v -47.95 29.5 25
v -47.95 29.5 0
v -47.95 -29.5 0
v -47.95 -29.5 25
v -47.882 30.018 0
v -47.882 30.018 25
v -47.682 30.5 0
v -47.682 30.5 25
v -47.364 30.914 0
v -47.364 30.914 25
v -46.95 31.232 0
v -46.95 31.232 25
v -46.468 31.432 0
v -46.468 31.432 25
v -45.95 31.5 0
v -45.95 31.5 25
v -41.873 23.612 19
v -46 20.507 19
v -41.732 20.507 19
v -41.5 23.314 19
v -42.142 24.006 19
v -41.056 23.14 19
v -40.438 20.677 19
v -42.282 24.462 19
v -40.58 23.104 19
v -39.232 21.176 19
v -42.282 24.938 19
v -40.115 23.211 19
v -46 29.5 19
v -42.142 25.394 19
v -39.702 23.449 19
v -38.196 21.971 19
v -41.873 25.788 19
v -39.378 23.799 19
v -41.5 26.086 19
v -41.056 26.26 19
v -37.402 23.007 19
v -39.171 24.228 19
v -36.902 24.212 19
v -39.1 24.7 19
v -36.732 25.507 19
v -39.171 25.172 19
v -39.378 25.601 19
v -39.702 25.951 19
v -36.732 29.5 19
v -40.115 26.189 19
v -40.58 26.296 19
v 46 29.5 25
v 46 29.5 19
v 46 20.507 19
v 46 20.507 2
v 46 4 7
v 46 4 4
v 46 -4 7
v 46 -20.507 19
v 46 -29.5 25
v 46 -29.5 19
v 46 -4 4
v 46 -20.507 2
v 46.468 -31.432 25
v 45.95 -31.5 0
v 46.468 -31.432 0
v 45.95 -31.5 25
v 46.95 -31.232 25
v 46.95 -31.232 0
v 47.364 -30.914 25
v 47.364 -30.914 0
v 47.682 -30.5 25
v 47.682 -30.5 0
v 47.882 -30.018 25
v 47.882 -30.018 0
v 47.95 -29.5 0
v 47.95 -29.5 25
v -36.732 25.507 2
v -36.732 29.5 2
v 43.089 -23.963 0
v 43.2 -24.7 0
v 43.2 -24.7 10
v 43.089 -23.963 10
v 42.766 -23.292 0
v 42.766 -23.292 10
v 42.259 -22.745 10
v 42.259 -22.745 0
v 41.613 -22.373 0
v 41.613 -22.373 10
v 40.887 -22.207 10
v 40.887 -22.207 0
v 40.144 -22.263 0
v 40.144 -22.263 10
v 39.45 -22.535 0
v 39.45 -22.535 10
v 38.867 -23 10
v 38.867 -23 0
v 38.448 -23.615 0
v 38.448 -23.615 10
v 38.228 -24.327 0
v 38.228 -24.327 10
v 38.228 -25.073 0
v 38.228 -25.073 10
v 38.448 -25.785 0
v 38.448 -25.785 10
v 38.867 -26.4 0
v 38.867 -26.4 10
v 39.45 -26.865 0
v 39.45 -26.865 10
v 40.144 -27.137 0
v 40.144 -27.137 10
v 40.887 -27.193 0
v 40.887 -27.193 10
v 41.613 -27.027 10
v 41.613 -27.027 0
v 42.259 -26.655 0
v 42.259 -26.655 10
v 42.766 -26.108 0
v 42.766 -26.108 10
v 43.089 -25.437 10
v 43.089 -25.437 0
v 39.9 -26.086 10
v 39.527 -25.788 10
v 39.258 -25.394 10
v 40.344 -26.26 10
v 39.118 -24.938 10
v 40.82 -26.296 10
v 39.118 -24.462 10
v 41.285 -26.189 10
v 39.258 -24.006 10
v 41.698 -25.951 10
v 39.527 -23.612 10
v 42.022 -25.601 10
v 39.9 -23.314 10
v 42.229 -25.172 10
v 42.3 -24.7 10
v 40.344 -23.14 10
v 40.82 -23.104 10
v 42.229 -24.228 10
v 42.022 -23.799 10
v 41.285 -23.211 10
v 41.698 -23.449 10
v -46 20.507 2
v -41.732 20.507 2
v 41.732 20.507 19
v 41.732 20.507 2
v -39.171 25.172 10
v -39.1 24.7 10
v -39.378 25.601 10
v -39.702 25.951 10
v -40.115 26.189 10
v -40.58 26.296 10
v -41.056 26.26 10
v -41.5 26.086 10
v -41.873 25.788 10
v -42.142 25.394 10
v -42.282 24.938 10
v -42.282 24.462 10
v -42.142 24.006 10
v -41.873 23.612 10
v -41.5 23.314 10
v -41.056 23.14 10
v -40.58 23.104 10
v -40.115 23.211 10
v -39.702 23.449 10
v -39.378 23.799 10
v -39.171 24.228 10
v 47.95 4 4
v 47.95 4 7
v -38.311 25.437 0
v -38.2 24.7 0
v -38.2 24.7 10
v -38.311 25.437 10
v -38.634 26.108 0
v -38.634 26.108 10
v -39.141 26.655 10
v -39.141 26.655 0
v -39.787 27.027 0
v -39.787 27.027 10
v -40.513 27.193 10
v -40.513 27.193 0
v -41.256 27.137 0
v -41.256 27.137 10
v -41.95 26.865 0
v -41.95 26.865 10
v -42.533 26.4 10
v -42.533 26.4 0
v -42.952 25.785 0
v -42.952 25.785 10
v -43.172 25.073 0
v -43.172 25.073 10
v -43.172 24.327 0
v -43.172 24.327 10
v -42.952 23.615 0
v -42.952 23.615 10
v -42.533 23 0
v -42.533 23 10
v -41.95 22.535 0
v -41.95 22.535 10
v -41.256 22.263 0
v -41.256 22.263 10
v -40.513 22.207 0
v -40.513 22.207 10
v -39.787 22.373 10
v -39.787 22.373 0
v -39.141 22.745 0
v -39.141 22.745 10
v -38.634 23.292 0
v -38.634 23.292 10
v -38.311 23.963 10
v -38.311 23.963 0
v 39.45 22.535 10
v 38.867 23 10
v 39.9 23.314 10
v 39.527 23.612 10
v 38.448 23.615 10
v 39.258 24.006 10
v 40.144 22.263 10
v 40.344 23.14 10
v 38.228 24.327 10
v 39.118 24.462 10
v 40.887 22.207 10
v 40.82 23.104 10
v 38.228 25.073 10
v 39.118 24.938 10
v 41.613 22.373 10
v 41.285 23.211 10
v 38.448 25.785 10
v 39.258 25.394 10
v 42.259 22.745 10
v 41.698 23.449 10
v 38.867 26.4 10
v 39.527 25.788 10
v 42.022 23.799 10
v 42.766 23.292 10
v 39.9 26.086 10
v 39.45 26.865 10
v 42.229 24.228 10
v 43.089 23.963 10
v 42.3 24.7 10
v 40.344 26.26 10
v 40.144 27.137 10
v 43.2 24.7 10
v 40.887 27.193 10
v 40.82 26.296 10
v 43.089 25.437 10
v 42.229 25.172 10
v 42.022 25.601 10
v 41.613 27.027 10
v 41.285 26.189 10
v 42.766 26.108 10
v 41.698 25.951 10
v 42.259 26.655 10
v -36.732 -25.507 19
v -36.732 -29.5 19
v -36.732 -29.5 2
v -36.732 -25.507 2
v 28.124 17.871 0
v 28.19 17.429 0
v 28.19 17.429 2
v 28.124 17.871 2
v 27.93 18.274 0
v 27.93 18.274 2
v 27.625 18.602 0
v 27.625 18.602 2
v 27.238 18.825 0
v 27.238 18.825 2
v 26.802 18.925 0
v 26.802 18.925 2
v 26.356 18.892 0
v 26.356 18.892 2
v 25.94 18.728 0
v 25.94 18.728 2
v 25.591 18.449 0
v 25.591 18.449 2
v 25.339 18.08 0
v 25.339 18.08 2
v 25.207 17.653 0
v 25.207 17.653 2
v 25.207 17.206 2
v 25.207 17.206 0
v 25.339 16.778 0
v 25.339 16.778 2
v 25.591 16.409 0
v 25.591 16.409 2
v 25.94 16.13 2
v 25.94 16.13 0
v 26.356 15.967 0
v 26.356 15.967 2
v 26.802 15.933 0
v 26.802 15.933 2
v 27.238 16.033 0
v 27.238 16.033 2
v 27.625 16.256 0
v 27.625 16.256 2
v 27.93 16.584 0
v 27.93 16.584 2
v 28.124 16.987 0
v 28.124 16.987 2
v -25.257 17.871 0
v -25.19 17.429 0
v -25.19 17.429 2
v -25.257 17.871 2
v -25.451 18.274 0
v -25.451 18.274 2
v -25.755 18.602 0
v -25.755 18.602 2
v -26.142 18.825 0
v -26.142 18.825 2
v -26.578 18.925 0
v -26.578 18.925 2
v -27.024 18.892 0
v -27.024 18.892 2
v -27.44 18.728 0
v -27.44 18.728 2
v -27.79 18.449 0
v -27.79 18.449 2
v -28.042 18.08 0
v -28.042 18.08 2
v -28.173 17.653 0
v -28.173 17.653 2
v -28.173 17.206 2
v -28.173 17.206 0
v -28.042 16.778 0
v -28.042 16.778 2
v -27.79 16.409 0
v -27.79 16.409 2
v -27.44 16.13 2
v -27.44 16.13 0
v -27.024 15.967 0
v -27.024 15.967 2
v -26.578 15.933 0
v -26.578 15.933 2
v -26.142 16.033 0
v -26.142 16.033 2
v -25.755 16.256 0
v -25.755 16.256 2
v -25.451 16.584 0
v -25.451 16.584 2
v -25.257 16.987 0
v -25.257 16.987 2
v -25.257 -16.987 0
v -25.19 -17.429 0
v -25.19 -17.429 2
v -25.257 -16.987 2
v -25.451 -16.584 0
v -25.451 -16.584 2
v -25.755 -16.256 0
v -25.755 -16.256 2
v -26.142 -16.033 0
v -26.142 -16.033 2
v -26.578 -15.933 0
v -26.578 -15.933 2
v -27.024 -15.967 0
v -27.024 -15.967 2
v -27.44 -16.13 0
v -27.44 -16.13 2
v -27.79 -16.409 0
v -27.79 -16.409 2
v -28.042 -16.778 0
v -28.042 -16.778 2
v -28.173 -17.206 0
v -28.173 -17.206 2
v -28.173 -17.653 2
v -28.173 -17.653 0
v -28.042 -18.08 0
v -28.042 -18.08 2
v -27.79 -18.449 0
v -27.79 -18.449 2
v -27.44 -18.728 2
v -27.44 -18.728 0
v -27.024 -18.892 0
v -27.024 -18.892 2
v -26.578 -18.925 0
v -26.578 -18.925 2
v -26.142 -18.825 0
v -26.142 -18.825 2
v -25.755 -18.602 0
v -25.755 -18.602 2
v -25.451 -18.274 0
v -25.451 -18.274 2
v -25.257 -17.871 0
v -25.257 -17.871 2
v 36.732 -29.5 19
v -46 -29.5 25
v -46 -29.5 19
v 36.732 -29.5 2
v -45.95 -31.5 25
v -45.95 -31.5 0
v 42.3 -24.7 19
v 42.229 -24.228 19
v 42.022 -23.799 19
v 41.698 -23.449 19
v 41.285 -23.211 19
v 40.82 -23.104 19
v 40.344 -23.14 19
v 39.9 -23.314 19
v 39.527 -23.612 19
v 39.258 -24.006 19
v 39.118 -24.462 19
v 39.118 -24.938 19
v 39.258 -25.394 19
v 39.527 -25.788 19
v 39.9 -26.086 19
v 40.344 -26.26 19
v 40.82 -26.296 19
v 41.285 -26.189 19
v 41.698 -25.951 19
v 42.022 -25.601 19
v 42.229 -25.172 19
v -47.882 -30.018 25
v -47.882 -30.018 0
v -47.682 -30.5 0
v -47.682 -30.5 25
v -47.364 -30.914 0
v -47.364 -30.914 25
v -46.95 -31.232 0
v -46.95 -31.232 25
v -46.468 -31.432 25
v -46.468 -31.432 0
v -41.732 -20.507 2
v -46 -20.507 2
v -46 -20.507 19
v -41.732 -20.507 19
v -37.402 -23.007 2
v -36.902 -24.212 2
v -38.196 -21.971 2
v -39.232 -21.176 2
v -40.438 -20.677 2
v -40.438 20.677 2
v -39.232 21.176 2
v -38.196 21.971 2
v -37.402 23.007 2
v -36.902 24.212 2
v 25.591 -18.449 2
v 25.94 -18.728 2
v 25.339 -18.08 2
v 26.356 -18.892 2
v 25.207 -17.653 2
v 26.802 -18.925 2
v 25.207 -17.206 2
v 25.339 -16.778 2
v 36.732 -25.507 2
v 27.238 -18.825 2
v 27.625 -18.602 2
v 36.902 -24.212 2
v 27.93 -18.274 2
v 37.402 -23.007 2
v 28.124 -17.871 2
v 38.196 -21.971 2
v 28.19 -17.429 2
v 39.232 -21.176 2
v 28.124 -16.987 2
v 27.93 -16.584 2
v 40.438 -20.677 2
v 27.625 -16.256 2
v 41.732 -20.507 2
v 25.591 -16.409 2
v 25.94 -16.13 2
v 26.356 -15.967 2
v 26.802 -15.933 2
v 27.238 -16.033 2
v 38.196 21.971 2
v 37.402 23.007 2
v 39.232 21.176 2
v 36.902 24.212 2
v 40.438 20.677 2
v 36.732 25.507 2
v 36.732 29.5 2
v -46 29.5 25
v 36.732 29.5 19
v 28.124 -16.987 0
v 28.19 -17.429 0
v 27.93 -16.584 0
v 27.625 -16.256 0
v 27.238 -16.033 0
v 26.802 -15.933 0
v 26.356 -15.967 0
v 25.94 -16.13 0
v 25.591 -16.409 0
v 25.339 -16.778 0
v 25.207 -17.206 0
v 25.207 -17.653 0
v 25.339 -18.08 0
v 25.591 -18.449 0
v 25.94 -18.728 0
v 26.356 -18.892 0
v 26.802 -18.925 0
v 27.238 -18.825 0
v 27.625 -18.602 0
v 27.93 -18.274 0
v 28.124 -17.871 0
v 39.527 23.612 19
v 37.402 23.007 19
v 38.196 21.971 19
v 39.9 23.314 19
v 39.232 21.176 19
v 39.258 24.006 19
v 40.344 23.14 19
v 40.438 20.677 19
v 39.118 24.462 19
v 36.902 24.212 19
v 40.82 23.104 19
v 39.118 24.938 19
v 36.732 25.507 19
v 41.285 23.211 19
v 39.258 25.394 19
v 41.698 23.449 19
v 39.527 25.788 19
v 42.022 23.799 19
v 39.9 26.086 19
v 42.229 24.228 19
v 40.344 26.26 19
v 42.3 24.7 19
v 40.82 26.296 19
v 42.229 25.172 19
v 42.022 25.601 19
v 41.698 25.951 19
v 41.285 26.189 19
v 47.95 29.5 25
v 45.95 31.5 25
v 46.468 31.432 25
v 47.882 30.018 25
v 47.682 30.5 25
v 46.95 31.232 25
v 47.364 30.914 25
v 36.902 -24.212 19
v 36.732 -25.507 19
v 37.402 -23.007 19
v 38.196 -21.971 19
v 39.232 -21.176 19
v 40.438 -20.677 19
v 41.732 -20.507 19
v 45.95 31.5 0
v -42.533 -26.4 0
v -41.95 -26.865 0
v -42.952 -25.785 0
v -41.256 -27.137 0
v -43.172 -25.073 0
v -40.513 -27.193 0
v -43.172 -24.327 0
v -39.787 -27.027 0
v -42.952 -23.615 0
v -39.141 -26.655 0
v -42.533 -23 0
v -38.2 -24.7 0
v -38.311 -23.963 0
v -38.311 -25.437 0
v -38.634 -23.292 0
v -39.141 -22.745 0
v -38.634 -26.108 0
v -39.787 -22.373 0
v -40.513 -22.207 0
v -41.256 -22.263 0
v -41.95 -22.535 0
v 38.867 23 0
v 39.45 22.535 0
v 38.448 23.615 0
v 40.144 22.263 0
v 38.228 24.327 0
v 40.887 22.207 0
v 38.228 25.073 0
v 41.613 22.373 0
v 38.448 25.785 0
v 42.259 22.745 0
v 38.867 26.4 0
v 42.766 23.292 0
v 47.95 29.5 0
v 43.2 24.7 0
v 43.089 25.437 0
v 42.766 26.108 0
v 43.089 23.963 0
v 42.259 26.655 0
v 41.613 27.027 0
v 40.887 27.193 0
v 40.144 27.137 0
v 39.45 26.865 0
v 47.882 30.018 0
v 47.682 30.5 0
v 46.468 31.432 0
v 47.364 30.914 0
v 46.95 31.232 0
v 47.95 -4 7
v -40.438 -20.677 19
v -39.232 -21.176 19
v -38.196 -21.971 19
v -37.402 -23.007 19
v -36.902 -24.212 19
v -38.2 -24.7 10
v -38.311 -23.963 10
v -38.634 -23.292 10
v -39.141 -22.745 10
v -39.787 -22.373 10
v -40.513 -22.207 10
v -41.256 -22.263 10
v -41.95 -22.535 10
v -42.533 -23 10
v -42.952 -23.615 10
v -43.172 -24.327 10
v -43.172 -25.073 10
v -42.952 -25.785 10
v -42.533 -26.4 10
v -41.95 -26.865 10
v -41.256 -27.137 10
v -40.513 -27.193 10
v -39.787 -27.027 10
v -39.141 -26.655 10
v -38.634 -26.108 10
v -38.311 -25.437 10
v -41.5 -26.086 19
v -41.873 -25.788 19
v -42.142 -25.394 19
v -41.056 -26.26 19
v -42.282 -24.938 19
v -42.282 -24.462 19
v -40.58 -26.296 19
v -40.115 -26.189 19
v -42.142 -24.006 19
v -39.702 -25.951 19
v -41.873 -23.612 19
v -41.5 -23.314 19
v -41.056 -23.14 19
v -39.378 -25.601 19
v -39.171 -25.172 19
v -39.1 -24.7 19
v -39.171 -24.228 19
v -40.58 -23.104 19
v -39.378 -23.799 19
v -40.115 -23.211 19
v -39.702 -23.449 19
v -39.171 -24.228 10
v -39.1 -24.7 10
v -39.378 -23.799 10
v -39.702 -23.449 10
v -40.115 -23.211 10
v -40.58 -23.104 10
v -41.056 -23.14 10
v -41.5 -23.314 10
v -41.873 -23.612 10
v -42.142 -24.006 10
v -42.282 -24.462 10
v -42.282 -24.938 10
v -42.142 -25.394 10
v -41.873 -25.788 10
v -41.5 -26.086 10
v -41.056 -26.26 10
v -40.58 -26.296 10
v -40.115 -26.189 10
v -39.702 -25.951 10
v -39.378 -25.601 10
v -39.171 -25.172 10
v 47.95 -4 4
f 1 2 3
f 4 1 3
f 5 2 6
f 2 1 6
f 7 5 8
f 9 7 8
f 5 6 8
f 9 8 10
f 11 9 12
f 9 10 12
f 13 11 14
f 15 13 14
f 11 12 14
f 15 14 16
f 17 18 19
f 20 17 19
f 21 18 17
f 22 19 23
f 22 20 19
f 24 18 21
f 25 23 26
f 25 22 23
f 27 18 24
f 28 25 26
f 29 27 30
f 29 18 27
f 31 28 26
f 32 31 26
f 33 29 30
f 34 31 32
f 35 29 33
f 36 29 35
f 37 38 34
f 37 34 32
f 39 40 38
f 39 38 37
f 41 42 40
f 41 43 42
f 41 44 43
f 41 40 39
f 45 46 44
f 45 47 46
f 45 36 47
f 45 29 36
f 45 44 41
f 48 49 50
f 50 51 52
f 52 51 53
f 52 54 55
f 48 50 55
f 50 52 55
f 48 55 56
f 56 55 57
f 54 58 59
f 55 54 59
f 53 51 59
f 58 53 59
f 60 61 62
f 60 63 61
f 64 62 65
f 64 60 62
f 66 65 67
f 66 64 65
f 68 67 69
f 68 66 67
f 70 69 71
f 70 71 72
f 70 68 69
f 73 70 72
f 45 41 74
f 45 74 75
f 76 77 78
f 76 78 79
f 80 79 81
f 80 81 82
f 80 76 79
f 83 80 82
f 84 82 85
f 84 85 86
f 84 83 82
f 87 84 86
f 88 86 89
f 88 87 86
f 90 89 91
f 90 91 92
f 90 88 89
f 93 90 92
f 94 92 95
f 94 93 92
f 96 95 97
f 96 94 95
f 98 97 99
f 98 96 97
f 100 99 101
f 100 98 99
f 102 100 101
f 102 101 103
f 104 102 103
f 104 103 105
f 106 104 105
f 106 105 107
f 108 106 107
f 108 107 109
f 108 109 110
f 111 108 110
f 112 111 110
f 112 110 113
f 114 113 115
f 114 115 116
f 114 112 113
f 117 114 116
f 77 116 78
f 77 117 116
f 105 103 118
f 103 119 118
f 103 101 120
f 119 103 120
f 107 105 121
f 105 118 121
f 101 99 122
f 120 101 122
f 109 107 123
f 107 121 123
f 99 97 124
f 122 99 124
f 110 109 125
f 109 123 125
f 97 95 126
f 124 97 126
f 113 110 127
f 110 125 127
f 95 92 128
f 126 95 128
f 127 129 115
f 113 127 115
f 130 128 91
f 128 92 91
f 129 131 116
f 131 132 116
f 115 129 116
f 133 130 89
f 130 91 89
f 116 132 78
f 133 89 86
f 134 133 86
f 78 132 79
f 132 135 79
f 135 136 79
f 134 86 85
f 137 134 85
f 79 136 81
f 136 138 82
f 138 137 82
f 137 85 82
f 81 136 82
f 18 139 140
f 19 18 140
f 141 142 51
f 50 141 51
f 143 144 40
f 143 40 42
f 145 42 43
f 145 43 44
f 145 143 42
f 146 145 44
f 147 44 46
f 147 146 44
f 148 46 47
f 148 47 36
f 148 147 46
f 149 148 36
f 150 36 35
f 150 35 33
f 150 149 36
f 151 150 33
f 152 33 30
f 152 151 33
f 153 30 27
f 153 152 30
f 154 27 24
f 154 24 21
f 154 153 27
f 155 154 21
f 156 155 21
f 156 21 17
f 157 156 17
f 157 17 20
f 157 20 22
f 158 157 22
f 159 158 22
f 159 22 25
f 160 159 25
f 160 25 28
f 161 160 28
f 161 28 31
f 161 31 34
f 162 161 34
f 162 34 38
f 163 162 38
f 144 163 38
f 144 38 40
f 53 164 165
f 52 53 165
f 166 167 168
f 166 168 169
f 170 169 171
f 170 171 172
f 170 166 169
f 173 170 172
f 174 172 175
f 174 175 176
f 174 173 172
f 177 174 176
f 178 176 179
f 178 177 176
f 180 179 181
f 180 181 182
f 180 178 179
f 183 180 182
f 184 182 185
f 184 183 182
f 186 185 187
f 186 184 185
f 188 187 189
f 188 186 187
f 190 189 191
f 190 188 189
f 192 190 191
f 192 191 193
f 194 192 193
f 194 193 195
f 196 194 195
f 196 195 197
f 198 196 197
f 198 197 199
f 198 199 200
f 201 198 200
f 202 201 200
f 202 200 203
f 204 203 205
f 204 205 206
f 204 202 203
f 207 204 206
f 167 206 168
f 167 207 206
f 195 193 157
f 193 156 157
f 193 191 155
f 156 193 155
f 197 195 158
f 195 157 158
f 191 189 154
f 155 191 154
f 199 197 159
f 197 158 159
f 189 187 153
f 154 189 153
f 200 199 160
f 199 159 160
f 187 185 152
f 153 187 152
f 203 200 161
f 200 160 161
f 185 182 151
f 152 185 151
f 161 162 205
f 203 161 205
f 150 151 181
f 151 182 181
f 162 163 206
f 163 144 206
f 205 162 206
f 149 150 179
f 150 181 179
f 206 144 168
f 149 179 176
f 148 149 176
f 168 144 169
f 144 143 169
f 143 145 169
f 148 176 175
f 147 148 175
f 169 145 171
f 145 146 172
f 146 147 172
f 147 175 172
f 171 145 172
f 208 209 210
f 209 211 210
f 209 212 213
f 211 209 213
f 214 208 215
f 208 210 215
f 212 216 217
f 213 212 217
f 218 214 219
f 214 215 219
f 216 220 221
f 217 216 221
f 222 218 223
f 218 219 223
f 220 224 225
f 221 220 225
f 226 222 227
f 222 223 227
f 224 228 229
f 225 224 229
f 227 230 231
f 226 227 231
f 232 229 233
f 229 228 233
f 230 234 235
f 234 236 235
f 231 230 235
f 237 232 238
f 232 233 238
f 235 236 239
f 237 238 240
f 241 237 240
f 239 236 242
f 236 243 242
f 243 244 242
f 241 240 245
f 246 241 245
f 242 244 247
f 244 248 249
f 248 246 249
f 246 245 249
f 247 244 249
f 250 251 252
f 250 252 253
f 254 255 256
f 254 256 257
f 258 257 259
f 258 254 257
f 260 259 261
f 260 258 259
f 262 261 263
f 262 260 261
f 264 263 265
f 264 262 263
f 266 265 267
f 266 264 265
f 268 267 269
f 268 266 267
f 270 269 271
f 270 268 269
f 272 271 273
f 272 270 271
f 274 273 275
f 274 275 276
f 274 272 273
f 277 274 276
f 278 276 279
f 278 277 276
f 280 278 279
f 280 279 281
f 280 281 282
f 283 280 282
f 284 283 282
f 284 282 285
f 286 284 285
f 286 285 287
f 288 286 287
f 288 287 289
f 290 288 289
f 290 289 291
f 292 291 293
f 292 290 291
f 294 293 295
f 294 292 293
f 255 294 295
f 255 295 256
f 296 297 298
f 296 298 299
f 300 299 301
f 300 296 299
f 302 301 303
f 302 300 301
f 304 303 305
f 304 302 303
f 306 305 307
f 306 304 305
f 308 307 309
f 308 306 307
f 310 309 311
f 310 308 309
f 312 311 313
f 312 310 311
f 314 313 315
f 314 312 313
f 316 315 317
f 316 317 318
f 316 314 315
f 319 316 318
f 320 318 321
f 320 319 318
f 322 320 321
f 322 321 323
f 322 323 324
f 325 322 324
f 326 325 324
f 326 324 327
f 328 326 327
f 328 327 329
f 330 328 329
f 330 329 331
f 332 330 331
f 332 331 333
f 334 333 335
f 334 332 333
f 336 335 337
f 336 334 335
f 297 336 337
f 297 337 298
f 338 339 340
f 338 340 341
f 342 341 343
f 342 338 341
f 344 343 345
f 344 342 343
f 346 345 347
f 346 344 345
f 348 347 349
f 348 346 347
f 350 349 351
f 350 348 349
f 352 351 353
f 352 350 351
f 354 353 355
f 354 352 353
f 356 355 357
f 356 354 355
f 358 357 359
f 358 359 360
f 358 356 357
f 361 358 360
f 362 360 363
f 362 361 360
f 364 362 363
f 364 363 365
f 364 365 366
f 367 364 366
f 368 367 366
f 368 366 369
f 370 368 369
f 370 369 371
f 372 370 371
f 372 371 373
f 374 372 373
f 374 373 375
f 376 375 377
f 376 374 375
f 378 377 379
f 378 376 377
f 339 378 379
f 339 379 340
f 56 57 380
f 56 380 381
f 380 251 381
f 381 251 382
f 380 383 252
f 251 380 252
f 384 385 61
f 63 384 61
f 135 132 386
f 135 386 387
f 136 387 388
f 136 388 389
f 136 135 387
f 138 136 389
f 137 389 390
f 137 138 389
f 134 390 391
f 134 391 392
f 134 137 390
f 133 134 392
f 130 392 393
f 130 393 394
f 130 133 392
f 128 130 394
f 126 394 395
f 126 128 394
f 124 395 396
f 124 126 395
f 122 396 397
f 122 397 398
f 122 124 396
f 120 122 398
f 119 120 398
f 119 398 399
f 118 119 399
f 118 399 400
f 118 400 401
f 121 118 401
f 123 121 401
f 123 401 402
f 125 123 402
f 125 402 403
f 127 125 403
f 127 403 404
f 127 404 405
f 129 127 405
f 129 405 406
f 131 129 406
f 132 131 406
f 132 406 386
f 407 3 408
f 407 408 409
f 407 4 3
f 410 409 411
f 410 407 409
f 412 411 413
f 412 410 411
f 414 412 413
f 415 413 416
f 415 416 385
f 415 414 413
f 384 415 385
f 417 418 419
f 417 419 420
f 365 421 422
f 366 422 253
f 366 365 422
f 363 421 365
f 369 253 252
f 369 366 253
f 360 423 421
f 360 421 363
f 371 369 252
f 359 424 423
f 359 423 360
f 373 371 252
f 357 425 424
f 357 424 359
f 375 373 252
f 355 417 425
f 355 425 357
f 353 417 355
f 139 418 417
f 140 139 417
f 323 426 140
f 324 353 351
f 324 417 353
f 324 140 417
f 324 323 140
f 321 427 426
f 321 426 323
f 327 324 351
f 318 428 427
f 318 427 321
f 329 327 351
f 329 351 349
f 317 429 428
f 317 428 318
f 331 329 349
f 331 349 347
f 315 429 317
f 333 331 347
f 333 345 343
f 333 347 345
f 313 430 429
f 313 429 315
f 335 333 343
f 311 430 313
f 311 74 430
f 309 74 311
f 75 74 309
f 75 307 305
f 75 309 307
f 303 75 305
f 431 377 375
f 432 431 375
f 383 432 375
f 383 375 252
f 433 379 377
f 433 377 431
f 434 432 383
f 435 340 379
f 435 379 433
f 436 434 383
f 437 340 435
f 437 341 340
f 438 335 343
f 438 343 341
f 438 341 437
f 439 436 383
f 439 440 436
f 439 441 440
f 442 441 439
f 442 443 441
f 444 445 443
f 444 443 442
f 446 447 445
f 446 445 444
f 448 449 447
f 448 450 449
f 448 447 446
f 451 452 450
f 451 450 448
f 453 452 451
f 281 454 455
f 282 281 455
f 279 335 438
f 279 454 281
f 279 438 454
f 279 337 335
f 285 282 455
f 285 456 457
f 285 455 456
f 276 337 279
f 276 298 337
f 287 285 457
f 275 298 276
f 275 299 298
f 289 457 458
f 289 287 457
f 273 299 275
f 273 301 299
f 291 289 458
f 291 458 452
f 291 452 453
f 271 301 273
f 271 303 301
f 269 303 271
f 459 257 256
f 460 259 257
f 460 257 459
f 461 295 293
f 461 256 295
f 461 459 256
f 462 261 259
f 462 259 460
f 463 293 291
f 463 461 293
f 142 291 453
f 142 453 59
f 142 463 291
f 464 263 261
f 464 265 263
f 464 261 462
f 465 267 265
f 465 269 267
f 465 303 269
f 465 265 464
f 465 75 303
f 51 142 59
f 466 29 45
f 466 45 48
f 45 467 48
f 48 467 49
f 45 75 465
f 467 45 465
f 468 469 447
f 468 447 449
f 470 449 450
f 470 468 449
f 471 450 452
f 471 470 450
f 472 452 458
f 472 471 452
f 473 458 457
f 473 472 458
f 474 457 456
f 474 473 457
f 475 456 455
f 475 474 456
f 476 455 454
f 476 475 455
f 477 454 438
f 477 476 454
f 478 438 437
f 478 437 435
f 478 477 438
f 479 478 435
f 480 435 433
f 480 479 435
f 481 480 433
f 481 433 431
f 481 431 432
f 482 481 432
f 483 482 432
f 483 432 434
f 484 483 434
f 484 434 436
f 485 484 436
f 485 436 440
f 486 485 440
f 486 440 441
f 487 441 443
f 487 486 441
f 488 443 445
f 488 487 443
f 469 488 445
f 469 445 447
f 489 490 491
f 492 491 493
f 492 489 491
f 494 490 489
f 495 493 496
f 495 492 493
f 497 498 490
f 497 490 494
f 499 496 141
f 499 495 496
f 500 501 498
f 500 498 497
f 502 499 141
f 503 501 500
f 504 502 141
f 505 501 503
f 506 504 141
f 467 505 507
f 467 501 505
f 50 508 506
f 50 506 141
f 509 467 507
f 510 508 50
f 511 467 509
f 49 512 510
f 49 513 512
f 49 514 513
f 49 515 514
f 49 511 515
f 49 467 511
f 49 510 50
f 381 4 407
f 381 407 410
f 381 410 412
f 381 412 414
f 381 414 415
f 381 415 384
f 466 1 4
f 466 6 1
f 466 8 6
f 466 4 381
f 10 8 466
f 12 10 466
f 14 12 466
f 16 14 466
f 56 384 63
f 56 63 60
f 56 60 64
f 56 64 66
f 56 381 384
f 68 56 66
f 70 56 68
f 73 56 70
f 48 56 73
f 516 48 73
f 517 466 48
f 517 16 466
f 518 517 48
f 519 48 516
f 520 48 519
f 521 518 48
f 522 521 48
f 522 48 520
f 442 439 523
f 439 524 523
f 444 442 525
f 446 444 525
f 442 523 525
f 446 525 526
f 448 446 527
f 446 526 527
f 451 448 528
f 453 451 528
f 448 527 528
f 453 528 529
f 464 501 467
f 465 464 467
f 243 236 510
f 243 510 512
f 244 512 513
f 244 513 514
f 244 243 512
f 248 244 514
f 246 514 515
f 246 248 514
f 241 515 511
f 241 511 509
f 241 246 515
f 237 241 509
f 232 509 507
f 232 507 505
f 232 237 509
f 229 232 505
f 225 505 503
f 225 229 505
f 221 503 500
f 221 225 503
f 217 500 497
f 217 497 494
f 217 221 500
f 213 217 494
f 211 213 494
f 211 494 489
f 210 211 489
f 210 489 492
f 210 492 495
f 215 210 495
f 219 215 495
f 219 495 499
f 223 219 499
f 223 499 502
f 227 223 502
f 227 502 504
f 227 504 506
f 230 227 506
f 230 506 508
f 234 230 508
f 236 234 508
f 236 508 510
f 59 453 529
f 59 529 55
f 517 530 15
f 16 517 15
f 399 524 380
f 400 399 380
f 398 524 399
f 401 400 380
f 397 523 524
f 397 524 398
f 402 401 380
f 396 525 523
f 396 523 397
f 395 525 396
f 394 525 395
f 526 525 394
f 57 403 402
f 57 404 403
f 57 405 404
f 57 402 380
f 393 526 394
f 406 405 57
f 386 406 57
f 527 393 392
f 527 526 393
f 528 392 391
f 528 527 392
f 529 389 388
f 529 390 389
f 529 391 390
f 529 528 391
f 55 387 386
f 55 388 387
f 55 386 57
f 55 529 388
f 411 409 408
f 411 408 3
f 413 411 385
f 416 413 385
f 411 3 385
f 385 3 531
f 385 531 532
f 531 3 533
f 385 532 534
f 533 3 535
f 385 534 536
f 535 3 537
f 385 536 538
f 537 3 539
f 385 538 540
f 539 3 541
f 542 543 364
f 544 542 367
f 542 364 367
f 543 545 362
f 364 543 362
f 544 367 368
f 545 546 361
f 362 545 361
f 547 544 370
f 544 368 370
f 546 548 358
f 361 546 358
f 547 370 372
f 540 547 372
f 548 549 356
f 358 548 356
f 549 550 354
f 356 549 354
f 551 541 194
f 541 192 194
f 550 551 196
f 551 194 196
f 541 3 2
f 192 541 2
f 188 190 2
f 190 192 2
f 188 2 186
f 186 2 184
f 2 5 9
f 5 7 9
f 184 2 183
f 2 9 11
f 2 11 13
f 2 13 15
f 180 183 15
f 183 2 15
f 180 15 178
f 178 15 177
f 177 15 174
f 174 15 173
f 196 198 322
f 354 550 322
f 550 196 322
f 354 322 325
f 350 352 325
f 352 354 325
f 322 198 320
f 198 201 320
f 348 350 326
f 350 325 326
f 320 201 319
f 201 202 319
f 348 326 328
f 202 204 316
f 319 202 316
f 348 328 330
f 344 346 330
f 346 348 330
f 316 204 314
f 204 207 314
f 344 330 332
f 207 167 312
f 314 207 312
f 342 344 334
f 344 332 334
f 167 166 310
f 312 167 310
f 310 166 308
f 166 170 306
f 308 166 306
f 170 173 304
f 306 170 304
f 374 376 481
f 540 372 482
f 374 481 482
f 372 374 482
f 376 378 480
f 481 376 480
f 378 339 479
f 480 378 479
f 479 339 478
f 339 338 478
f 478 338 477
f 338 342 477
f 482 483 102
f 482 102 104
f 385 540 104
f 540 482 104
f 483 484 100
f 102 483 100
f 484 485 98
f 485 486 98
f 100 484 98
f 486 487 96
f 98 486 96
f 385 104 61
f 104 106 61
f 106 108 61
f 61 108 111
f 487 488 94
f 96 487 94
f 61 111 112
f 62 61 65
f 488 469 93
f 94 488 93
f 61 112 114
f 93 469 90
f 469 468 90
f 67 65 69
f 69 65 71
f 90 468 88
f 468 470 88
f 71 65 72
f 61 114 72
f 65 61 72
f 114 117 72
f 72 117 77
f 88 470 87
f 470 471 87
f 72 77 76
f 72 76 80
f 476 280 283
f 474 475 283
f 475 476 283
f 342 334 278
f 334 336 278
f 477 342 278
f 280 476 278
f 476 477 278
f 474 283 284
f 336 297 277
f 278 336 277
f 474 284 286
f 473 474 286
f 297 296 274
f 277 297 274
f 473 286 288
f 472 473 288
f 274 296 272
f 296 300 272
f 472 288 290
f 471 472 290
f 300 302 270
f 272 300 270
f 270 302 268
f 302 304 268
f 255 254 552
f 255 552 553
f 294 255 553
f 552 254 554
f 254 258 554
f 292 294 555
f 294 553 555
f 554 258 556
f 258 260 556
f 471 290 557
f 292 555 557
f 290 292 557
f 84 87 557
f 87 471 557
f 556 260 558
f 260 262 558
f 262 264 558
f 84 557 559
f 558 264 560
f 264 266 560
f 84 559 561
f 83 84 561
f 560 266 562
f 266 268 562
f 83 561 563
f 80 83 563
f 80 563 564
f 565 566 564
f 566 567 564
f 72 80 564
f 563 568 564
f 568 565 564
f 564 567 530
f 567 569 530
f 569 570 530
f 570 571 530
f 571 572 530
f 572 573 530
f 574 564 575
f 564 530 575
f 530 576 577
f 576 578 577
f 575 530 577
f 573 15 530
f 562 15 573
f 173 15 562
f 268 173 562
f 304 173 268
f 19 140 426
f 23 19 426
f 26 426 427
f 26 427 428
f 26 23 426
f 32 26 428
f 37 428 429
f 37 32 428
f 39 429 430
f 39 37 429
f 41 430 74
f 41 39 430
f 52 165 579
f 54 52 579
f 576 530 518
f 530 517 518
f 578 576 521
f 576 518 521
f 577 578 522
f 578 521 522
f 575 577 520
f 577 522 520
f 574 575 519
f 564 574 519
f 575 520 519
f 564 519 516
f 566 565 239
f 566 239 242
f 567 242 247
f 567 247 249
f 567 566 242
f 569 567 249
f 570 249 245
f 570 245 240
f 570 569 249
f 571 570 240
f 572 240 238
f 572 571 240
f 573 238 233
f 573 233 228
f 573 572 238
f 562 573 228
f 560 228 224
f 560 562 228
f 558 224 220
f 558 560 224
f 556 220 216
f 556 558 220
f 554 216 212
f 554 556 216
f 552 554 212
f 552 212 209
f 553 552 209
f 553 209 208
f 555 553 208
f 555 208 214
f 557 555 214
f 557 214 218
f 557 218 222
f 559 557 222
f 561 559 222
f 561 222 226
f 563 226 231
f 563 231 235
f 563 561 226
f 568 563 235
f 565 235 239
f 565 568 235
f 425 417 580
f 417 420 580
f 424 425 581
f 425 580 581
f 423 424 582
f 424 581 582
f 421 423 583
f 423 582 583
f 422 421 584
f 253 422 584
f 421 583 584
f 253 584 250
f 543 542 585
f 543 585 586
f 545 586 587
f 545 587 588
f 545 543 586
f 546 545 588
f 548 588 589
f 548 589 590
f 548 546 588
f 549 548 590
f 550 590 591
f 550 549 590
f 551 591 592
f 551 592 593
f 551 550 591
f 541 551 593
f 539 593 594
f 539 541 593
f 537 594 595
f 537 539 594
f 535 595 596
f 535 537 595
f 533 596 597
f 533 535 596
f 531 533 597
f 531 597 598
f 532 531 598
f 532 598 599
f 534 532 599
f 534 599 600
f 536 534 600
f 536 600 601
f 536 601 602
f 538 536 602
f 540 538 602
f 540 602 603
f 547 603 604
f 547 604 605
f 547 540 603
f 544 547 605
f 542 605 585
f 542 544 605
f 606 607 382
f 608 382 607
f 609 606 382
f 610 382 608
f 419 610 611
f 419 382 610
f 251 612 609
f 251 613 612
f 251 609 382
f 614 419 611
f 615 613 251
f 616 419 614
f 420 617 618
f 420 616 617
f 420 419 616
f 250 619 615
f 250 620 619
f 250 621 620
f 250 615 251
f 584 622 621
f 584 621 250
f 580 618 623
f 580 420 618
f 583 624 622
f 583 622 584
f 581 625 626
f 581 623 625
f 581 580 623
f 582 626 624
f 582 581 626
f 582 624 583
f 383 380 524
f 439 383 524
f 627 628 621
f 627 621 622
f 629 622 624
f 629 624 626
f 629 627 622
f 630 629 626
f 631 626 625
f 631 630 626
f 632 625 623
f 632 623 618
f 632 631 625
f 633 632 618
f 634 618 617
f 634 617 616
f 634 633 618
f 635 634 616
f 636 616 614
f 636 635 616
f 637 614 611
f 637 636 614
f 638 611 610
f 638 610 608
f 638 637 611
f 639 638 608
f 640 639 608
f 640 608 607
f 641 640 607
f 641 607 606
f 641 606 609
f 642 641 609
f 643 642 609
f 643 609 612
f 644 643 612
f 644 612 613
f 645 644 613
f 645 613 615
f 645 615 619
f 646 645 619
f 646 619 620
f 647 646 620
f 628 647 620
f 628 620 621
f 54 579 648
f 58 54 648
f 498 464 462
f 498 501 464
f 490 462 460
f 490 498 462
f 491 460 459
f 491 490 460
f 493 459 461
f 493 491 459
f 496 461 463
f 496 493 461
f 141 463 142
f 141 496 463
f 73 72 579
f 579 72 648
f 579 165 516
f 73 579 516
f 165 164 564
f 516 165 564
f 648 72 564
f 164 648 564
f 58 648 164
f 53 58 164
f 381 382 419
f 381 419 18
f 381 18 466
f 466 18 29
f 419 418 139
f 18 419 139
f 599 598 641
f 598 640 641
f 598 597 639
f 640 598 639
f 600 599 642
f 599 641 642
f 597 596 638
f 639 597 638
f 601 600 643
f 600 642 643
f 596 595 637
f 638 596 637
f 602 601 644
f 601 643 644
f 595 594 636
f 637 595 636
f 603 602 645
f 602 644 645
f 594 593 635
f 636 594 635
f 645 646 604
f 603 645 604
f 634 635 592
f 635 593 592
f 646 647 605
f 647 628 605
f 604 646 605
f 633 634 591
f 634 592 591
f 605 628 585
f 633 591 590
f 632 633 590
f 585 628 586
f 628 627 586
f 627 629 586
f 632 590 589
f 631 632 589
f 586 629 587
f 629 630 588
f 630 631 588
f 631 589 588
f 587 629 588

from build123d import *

# Parameters (mm, degrees)
F1_DEPTH  = 25
F2_R      = 2
F3_R      = 2
F0_R      = 1.5
F4_DEPTH  = 2
F0_W      = 9.26834
F0_H      = 8.993458
F0_R_2    = 2.5
F5_DEPTH  = 19
F6_R      = 5
F0_R_3    = 1.6
F7_DEPTH  = 19
F8_DEPTH  = 10
F10_DEPTH = 25


with BuildPart() as f1:
    # F0 (on Top) → F1 (new body)
    with BuildSketch(Plane.XY):
        Polygon((-47.95, 31.5), (-47.95, 0), (-47.95, -31.5), (0, -31.5), (47.95, -31.5), (47.95, 0), (47.95, 31.5), (0, 31.5), align=None)
        Polygon((-46, -20.506542), (-46, 0), (-46, 20.506542), (-46, 29.5), (-36.73166, 29.5), (0, 29.5), (36.73166, 29.5), (46, 29.5), (46, 20.506542), (46, 0), (46, -20.506542), (46, -29.5), (36.73166, -29.5), (0, -29.5), (-36.73166, -29.5), (-46, -29.5), align=None, mode=Mode.SUBTRACT)
    extrude(amount=F1_DEPTH)

    # F2
    f2_edges = [f1.edges().sort_by_distance(p)[0] for p in [
        (-47.95, -31.5, 12.5),
    ]]
    fillet(f2_edges, radius=F2_R)

    # F3
    f3_edges = [f1.edges().sort_by_distance(p)[0] for p in [
        (47.95, -31.5, 12.5),
        (47.95, 31.5, 12.5),
        (-47.95, 31.5, 12.5),
    ]]
    fillet(f3_edges, radius=F3_R)

    # F0 (on Top) → F4 (join)
    with BuildSketch(Plane.XY):
        Polygon((-46, 20.506542), (-46, 0), (-46, -20.506542), (-36.73166, -20.506542), (-36.73166, -29.5), (0, -29.5), (36.73166, -29.5), (36.73166, -20.506542), (46, -20.506542), (46, 0), (46, 20.506542), (36.73166, 20.506542), (36.73166, 29.5), (0, 29.5), (-36.73166, 29.5), (-36.73166, 20.506542), align=None)
        with Locations((-26.690211, -17.429141)):
            Circle(F0_R, mode=Mode.SUBTRACT)
        with Locations((26.690211, -17.429141)):
            Circle(F0_R, mode=Mode.SUBTRACT)
        with Locations((-26.690211, 17.429141)):
            Circle(F0_R, mode=Mode.SUBTRACT)
        with Locations((26.690211, 17.429141)):
            Circle(F0_R, mode=Mode.SUBTRACT)
    extrude(amount=F4_DEPTH)

    # F0 (on Top) → F5 (join)
    with BuildSketch(Plane.XY):
        with Locations((-41.36583, 25.003271)):
            Rectangle(F0_W, F0_H)
        with Locations((-40.7, 24.7)):
            Circle(F0_R_2, mode=Mode.SUBTRACT)
        with Locations((41.36583, 25.003271)):
            Rectangle(F0_W, F0_H)
        with Locations((40.7, 24.7)):
            Circle(F0_R_2, mode=Mode.SUBTRACT)
        with Locations((41.36583, -25.003271)):
            Rectangle(F0_W, F0_H)
        with Locations((40.7, -24.7)):
            Circle(F0_R_2, mode=Mode.SUBTRACT)
        with Locations((-41.36583, -25.003271)):
            Rectangle(F0_W, F0_H)
        with Locations((-40.7, -24.7)):
            Circle(F0_R_2, mode=Mode.SUBTRACT)
    extrude(amount=F5_DEPTH)

    # F6
    f6_edges = [f1.edges().sort_by_distance(p)[0] for p in [
        (-36.73166, 20.506542, 10.5),
        (36.73166, 20.506542, 10.5),
        (36.73166, -20.506542, 10.5),
        (-36.73166, -20.506542, 10.5),
    ]]
    fillet(f6_edges, radius=F6_R)

    # F0 (on Top) → F7 (join)
    with BuildSketch(Plane.XY):
        with Locations((-40.7, 24.7)):
            Circle(F0_R_2)
        with Locations((-40.7, 24.7)):
            Circle(F0_R_3, mode=Mode.SUBTRACT)
        with Locations((40.7, 24.7)):
            Circle(F0_R_2)
        with Locations((40.7, 24.7)):
            Circle(F0_R_3, mode=Mode.SUBTRACT)
        with Locations((40.7, -24.7)):
            Circle(F0_R_2)
        with Locations((40.7, -24.7)):
            Circle(F0_R_3, mode=Mode.SUBTRACT)
        with Locations((-40.7, -24.7)):
            Circle(F0_R_2)
        with Locations((-40.7, -24.7)):
            Circle(F0_R_3, mode=Mode.SUBTRACT)
    extrude(amount=F7_DEPTH)

    # F0 (on Top) → F8 (cut)
    with BuildSketch(Plane.XY):
        with Locations((-40.7, 24.7)):
            Circle(F0_R_2)
        with Locations((-40.7, 24.7)):
            Circle(F0_R_3, mode=Mode.SUBTRACT)
        with Locations((-40.7, -24.7)):
            Circle(F0_R_2)
        with Locations((-40.7, -24.7)):
            Circle(F0_R_3, mode=Mode.SUBTRACT)
        with Locations((40.7, -24.7)):
            Circle(F0_R_2)
        with Locations((40.7, -24.7)):
            Circle(F0_R_3, mode=Mode.SUBTRACT)
        with Locations((40.7, 24.7)):
            Circle(F0_R_2)
        with Locations((40.7, 24.7)):
            Circle(F0_R_3, mode=Mode.SUBTRACT)
    extrude(amount=F8_DEPTH, mode=Mode.SUBTRACT)

    # F9 (on face) → F10 (cut)
    with BuildSketch(Plane.YZ.offset(47.95)):
        Polygon((-4, 4), (0, 4), (4, 4), (4, 7), (0, 7), (-4, 7), align=None)
    extrude(amount=-F10_DEPTH, mode=Mode.SUBTRACT)


solid = f1.part
